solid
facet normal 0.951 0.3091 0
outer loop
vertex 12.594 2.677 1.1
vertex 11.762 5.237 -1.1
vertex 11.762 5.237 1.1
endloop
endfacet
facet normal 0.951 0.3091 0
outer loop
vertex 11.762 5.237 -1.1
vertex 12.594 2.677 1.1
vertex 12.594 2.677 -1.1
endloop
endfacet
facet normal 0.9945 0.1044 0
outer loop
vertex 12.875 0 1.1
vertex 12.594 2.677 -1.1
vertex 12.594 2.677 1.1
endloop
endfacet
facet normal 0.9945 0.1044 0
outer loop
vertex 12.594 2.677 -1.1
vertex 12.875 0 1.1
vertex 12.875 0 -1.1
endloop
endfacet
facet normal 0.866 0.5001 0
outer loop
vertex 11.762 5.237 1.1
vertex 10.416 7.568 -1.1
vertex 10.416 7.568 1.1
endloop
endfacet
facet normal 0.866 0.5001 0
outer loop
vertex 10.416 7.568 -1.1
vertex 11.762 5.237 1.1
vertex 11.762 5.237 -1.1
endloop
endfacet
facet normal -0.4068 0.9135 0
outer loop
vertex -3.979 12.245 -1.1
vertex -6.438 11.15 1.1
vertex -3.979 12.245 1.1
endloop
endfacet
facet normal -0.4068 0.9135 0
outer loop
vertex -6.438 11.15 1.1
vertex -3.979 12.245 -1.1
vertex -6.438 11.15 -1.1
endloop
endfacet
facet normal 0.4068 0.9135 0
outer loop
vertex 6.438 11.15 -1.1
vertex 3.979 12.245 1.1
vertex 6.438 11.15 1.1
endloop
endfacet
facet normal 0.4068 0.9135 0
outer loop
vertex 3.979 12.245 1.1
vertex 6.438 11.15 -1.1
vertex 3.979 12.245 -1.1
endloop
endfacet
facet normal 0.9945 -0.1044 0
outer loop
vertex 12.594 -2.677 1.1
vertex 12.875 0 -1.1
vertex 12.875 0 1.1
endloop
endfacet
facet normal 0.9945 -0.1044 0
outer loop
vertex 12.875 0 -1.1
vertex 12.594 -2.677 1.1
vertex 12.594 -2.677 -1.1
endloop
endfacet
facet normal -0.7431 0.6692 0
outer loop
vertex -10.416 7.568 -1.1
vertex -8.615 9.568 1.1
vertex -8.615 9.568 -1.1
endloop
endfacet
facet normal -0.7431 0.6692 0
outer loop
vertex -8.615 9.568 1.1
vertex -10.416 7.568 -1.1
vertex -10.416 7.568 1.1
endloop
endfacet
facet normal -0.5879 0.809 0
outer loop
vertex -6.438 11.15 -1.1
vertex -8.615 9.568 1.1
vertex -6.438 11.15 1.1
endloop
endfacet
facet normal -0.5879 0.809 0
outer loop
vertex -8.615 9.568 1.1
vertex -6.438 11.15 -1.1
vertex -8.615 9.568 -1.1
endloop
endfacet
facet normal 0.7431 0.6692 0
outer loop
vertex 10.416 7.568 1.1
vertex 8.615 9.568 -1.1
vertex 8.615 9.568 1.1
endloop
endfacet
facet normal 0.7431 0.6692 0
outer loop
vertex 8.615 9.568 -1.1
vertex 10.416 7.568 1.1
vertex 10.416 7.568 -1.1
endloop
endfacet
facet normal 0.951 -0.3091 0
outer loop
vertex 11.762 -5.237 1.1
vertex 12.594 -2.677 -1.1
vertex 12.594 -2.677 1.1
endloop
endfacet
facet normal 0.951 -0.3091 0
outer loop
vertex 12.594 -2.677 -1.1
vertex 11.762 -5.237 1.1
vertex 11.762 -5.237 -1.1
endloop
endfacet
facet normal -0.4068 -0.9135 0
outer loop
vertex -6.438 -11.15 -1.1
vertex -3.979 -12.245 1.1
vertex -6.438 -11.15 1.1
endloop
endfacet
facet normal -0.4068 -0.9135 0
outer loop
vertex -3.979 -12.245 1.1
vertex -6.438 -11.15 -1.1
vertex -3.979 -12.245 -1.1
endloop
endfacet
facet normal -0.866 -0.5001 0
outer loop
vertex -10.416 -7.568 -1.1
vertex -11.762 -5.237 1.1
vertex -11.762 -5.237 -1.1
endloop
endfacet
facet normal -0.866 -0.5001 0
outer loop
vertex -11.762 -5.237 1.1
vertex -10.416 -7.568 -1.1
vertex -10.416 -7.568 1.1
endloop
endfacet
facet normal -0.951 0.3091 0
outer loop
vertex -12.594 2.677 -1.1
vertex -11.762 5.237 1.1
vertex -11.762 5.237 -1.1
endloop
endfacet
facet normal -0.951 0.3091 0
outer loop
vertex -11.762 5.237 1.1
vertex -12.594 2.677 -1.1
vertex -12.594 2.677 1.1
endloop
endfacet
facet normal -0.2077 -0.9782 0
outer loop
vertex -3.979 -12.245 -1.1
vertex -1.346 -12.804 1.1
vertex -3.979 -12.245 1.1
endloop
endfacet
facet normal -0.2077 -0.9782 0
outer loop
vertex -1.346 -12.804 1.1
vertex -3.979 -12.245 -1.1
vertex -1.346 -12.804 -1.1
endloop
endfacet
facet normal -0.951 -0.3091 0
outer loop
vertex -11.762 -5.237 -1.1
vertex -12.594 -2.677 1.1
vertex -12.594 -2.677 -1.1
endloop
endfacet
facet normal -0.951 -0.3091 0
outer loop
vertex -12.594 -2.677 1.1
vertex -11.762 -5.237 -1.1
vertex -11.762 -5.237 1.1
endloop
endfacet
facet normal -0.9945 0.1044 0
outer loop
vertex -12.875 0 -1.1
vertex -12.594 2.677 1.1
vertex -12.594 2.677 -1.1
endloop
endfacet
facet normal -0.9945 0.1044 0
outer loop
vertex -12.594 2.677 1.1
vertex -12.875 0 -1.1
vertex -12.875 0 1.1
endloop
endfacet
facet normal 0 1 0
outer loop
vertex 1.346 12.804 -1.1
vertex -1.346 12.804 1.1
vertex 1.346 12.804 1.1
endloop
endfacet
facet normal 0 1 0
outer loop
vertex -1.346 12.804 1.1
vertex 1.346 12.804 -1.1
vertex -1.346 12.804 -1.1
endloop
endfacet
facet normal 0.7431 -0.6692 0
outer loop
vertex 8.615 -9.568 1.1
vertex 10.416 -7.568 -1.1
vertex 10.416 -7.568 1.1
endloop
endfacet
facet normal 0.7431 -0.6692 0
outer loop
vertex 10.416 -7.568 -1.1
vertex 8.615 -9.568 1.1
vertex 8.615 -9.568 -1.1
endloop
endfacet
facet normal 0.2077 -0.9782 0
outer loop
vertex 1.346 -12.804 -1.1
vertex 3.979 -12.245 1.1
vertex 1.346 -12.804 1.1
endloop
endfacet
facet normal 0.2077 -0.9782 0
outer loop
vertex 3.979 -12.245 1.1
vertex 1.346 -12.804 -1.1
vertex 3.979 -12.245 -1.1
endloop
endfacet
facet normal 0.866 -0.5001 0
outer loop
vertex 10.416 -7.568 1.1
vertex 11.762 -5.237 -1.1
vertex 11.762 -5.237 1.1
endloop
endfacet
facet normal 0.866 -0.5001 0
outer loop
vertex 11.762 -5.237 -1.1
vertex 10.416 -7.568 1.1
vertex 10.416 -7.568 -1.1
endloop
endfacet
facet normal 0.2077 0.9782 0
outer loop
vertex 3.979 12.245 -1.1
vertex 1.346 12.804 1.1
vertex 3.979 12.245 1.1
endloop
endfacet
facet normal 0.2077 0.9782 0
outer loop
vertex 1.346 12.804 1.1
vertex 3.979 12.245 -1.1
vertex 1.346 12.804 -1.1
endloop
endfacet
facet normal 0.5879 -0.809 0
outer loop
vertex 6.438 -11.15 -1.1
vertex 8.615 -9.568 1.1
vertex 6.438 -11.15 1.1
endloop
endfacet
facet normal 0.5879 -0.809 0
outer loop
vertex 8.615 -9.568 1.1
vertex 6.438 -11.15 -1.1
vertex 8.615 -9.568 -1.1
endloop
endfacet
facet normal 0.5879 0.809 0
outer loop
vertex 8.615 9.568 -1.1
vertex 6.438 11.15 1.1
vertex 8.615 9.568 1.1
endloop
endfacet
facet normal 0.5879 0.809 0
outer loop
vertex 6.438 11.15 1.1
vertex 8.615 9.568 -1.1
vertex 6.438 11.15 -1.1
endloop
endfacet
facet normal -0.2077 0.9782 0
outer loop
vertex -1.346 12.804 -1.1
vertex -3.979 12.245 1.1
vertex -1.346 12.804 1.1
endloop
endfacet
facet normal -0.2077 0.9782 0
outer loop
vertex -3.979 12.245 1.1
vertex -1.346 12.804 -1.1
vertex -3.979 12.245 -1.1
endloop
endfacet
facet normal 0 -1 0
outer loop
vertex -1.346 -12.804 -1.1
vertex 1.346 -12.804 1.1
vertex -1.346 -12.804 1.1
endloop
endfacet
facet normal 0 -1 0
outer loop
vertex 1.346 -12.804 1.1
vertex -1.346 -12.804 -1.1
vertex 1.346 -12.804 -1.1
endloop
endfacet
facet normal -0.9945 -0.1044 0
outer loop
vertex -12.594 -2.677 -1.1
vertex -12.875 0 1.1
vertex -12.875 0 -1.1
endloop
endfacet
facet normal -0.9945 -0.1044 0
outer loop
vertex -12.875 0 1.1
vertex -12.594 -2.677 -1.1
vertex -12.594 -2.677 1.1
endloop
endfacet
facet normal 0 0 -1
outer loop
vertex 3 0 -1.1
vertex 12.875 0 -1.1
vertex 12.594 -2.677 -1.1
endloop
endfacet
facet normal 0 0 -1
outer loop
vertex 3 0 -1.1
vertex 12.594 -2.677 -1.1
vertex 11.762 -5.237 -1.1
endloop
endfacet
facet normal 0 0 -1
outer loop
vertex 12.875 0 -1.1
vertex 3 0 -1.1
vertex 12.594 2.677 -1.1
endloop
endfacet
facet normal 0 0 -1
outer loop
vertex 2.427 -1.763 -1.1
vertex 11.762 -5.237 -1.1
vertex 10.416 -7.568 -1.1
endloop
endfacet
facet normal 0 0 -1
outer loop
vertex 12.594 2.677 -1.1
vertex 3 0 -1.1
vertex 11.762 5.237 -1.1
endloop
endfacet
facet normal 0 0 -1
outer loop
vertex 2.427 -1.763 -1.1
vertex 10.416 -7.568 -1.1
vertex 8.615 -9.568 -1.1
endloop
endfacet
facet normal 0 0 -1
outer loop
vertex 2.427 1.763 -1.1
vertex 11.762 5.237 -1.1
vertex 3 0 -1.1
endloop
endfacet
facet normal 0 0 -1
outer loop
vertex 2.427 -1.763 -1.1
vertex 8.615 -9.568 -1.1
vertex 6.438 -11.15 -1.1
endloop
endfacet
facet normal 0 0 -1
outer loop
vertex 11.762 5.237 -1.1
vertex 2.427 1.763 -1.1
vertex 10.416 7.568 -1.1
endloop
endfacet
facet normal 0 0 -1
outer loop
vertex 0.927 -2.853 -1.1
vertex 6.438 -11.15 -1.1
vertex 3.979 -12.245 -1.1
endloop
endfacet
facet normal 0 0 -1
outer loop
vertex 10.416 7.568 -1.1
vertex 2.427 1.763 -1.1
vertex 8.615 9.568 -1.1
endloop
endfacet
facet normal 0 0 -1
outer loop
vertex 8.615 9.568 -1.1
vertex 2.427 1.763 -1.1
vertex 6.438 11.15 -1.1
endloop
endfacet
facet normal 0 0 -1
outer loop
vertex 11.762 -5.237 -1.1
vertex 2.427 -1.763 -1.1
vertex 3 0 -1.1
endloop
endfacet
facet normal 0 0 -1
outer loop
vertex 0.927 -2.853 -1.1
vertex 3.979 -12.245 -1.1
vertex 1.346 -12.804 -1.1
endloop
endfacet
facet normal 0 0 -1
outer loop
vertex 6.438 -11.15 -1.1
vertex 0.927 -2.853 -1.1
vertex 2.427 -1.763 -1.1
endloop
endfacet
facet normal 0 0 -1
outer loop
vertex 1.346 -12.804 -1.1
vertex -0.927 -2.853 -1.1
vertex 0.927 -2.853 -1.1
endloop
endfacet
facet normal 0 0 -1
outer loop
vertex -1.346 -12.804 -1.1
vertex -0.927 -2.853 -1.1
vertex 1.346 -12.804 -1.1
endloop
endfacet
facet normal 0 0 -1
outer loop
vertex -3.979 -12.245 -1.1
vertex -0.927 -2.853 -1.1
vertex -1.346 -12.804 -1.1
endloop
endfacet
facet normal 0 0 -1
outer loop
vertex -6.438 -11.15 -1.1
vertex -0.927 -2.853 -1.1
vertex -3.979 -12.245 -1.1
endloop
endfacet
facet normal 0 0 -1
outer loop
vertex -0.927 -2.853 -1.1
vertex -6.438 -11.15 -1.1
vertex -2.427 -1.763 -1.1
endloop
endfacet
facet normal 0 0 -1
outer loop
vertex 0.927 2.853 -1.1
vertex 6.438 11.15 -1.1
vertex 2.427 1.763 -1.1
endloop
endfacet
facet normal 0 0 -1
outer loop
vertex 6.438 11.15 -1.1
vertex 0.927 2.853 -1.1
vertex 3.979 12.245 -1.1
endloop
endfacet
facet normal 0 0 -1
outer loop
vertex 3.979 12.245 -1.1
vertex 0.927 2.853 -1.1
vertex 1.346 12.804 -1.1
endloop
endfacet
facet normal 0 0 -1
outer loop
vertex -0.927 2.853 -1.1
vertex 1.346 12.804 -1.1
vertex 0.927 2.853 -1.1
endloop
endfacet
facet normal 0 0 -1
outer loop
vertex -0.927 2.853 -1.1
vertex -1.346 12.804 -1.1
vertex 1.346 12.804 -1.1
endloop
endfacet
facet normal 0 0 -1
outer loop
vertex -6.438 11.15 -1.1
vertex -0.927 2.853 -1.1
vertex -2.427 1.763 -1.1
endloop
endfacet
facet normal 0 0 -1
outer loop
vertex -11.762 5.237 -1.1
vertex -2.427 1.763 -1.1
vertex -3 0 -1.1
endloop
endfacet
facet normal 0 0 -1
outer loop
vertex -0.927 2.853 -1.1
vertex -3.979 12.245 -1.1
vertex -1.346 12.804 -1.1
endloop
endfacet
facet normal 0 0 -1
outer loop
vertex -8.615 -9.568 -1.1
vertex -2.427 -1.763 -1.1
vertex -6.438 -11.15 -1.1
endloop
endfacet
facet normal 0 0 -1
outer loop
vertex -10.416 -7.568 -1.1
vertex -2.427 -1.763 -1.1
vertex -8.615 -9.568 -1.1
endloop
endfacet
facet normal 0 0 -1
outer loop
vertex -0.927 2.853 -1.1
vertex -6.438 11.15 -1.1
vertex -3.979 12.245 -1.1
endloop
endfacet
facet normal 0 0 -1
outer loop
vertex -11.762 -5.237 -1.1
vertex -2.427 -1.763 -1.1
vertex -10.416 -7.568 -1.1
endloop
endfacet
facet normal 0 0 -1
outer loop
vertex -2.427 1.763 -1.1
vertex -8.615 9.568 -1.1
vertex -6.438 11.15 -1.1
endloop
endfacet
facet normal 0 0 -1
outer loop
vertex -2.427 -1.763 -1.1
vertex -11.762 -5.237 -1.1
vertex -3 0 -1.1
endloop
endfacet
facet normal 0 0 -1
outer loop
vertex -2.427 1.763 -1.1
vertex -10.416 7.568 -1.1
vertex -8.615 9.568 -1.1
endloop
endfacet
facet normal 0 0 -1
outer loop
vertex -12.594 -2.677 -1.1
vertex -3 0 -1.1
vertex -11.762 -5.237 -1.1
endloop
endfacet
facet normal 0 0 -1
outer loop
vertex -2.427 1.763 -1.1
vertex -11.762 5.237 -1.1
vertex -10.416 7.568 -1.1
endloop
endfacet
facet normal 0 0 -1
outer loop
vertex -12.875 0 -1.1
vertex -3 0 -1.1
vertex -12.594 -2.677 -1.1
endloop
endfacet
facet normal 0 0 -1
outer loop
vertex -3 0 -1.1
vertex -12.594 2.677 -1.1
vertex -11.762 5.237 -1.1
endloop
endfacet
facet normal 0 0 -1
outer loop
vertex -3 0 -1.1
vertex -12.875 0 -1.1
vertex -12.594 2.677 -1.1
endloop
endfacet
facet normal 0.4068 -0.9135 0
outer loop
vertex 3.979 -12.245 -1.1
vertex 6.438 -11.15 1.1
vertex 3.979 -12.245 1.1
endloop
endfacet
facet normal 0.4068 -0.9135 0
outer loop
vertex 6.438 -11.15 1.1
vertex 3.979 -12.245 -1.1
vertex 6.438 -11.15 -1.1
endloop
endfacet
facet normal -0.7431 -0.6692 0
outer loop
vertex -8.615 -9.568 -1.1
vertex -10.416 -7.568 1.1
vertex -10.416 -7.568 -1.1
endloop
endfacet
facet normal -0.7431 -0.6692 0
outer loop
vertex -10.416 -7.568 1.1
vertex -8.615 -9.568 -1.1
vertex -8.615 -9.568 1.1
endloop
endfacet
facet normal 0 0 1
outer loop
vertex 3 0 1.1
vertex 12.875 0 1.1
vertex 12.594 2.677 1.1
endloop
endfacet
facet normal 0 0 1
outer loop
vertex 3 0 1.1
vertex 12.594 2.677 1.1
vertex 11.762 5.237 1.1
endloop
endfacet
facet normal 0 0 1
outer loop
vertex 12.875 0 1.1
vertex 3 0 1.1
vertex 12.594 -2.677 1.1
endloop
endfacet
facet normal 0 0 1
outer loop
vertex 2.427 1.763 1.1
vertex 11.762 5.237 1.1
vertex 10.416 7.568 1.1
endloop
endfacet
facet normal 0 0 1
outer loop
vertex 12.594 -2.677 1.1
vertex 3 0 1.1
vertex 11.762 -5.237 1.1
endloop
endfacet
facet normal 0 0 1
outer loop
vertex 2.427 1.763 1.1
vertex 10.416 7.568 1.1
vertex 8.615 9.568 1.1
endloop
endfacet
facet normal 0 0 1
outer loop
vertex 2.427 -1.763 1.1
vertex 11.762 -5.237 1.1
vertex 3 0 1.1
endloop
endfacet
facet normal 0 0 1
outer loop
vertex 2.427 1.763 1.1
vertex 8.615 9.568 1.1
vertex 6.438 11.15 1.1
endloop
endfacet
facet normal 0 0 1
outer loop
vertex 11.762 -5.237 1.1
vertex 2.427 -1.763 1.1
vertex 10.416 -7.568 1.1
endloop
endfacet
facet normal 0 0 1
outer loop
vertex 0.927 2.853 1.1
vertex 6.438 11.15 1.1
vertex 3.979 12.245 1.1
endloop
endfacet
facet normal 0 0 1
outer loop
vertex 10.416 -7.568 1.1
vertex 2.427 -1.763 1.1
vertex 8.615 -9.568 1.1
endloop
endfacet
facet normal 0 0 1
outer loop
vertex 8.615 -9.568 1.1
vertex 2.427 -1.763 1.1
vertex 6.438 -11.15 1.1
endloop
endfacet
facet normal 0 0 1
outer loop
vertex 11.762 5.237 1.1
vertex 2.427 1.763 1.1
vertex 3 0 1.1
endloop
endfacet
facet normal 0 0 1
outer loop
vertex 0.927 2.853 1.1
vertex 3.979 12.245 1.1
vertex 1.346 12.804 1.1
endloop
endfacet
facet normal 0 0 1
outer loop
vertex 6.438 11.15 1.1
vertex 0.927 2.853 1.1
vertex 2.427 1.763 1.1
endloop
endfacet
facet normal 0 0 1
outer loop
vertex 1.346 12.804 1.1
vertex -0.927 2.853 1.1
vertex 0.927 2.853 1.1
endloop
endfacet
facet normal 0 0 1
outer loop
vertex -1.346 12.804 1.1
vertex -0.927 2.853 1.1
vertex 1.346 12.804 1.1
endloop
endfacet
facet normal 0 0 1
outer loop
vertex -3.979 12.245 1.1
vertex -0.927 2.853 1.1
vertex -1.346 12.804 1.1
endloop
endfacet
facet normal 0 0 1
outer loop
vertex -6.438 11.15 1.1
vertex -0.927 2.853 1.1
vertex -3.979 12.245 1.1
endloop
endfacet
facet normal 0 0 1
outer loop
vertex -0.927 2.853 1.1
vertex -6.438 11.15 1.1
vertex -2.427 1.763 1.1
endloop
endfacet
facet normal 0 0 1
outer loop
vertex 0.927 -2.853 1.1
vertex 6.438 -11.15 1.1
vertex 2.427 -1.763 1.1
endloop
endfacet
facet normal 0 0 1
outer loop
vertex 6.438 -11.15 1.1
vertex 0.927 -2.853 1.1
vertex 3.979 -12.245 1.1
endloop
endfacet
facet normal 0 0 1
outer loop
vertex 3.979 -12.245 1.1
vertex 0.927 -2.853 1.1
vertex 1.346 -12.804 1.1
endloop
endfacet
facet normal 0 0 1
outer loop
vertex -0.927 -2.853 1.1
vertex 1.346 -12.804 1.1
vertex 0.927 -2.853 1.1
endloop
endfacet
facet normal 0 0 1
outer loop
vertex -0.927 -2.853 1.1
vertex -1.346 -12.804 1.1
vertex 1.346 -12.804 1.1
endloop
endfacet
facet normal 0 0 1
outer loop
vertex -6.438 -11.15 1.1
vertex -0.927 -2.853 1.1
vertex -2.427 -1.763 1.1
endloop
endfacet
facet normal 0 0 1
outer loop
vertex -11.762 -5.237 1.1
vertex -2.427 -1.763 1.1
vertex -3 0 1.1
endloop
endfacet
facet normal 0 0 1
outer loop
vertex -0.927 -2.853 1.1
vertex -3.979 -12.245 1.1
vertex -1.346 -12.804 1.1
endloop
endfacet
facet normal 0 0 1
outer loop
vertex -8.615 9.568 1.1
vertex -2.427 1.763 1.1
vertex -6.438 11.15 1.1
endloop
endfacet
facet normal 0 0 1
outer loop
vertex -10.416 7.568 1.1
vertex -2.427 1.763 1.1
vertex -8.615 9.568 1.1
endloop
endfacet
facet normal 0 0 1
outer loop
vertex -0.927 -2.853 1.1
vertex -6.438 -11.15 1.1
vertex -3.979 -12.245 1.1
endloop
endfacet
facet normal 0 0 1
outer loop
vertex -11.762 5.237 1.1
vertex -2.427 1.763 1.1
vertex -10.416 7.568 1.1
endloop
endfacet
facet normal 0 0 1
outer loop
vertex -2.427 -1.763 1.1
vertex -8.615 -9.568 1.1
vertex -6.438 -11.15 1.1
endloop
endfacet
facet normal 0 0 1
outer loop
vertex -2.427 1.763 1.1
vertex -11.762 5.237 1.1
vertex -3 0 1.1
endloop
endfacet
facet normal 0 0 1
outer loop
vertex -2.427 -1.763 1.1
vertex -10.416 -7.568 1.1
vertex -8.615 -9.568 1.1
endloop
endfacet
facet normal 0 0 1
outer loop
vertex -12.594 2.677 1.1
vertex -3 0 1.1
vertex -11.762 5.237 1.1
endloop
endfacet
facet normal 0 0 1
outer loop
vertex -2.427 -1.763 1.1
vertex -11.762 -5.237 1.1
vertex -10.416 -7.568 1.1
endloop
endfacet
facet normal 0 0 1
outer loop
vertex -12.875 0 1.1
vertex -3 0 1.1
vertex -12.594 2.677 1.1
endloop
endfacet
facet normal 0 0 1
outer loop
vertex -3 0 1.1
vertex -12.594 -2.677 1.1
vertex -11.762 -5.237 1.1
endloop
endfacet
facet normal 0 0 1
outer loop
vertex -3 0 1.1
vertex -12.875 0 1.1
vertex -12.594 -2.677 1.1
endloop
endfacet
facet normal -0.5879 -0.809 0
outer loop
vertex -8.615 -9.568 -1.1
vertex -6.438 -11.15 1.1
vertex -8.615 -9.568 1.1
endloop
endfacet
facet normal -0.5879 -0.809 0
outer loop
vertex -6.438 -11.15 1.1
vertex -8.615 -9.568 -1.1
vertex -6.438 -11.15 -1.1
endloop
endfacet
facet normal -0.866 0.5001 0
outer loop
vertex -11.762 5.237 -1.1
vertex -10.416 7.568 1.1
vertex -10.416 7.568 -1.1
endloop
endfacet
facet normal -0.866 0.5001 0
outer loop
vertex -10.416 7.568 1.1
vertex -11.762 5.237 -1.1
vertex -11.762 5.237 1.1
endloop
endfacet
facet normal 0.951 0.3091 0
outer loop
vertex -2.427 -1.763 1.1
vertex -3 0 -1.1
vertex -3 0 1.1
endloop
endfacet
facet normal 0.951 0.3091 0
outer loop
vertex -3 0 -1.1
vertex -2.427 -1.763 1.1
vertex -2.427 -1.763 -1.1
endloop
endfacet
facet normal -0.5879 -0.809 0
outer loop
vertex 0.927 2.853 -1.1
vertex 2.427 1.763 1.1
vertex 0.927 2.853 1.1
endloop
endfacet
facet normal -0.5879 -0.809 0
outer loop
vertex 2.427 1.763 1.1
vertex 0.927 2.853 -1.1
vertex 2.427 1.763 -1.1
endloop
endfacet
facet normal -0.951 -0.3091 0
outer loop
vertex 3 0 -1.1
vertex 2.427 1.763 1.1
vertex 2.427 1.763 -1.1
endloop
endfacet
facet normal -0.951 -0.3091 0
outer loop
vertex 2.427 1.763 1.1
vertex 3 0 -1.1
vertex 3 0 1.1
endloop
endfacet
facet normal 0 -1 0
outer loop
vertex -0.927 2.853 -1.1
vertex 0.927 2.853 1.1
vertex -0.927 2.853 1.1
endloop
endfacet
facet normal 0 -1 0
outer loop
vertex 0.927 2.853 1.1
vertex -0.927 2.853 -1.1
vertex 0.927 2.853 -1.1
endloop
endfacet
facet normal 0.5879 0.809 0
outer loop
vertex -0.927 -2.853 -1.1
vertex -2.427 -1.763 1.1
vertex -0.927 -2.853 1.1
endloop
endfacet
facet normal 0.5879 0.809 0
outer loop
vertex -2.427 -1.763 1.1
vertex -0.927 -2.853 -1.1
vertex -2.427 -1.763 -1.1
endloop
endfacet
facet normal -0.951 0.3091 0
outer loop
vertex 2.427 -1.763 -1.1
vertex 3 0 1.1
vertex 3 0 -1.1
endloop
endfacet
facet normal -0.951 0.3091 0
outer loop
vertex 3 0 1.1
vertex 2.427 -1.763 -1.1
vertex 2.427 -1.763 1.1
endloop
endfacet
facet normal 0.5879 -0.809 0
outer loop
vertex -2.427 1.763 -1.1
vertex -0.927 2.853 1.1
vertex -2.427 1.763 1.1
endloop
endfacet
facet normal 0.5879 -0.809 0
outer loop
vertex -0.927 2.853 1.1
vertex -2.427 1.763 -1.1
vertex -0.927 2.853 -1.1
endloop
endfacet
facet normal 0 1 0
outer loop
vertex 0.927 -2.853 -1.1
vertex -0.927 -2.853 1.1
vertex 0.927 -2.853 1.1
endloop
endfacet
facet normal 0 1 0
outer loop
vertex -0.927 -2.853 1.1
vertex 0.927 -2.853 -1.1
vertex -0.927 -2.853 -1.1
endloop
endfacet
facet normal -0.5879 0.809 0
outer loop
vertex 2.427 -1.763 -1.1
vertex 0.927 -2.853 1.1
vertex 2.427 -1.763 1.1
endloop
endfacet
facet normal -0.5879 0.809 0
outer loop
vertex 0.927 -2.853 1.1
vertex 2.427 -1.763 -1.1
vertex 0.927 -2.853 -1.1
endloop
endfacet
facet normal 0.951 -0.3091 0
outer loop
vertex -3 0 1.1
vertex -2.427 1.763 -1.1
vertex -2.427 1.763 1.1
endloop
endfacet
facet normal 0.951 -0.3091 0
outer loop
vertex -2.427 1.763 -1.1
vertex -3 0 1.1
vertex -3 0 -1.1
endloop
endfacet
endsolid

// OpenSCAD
// 1 euro
//d = 23.25;
//t = 2.33;

// 2 euro
d = 25.75;
t = 2.2;


hd = 6;

difference() {
  cylinder(d=d, h=t, center=true);
  cylinder(d=hd, h=t, center=true);
}
